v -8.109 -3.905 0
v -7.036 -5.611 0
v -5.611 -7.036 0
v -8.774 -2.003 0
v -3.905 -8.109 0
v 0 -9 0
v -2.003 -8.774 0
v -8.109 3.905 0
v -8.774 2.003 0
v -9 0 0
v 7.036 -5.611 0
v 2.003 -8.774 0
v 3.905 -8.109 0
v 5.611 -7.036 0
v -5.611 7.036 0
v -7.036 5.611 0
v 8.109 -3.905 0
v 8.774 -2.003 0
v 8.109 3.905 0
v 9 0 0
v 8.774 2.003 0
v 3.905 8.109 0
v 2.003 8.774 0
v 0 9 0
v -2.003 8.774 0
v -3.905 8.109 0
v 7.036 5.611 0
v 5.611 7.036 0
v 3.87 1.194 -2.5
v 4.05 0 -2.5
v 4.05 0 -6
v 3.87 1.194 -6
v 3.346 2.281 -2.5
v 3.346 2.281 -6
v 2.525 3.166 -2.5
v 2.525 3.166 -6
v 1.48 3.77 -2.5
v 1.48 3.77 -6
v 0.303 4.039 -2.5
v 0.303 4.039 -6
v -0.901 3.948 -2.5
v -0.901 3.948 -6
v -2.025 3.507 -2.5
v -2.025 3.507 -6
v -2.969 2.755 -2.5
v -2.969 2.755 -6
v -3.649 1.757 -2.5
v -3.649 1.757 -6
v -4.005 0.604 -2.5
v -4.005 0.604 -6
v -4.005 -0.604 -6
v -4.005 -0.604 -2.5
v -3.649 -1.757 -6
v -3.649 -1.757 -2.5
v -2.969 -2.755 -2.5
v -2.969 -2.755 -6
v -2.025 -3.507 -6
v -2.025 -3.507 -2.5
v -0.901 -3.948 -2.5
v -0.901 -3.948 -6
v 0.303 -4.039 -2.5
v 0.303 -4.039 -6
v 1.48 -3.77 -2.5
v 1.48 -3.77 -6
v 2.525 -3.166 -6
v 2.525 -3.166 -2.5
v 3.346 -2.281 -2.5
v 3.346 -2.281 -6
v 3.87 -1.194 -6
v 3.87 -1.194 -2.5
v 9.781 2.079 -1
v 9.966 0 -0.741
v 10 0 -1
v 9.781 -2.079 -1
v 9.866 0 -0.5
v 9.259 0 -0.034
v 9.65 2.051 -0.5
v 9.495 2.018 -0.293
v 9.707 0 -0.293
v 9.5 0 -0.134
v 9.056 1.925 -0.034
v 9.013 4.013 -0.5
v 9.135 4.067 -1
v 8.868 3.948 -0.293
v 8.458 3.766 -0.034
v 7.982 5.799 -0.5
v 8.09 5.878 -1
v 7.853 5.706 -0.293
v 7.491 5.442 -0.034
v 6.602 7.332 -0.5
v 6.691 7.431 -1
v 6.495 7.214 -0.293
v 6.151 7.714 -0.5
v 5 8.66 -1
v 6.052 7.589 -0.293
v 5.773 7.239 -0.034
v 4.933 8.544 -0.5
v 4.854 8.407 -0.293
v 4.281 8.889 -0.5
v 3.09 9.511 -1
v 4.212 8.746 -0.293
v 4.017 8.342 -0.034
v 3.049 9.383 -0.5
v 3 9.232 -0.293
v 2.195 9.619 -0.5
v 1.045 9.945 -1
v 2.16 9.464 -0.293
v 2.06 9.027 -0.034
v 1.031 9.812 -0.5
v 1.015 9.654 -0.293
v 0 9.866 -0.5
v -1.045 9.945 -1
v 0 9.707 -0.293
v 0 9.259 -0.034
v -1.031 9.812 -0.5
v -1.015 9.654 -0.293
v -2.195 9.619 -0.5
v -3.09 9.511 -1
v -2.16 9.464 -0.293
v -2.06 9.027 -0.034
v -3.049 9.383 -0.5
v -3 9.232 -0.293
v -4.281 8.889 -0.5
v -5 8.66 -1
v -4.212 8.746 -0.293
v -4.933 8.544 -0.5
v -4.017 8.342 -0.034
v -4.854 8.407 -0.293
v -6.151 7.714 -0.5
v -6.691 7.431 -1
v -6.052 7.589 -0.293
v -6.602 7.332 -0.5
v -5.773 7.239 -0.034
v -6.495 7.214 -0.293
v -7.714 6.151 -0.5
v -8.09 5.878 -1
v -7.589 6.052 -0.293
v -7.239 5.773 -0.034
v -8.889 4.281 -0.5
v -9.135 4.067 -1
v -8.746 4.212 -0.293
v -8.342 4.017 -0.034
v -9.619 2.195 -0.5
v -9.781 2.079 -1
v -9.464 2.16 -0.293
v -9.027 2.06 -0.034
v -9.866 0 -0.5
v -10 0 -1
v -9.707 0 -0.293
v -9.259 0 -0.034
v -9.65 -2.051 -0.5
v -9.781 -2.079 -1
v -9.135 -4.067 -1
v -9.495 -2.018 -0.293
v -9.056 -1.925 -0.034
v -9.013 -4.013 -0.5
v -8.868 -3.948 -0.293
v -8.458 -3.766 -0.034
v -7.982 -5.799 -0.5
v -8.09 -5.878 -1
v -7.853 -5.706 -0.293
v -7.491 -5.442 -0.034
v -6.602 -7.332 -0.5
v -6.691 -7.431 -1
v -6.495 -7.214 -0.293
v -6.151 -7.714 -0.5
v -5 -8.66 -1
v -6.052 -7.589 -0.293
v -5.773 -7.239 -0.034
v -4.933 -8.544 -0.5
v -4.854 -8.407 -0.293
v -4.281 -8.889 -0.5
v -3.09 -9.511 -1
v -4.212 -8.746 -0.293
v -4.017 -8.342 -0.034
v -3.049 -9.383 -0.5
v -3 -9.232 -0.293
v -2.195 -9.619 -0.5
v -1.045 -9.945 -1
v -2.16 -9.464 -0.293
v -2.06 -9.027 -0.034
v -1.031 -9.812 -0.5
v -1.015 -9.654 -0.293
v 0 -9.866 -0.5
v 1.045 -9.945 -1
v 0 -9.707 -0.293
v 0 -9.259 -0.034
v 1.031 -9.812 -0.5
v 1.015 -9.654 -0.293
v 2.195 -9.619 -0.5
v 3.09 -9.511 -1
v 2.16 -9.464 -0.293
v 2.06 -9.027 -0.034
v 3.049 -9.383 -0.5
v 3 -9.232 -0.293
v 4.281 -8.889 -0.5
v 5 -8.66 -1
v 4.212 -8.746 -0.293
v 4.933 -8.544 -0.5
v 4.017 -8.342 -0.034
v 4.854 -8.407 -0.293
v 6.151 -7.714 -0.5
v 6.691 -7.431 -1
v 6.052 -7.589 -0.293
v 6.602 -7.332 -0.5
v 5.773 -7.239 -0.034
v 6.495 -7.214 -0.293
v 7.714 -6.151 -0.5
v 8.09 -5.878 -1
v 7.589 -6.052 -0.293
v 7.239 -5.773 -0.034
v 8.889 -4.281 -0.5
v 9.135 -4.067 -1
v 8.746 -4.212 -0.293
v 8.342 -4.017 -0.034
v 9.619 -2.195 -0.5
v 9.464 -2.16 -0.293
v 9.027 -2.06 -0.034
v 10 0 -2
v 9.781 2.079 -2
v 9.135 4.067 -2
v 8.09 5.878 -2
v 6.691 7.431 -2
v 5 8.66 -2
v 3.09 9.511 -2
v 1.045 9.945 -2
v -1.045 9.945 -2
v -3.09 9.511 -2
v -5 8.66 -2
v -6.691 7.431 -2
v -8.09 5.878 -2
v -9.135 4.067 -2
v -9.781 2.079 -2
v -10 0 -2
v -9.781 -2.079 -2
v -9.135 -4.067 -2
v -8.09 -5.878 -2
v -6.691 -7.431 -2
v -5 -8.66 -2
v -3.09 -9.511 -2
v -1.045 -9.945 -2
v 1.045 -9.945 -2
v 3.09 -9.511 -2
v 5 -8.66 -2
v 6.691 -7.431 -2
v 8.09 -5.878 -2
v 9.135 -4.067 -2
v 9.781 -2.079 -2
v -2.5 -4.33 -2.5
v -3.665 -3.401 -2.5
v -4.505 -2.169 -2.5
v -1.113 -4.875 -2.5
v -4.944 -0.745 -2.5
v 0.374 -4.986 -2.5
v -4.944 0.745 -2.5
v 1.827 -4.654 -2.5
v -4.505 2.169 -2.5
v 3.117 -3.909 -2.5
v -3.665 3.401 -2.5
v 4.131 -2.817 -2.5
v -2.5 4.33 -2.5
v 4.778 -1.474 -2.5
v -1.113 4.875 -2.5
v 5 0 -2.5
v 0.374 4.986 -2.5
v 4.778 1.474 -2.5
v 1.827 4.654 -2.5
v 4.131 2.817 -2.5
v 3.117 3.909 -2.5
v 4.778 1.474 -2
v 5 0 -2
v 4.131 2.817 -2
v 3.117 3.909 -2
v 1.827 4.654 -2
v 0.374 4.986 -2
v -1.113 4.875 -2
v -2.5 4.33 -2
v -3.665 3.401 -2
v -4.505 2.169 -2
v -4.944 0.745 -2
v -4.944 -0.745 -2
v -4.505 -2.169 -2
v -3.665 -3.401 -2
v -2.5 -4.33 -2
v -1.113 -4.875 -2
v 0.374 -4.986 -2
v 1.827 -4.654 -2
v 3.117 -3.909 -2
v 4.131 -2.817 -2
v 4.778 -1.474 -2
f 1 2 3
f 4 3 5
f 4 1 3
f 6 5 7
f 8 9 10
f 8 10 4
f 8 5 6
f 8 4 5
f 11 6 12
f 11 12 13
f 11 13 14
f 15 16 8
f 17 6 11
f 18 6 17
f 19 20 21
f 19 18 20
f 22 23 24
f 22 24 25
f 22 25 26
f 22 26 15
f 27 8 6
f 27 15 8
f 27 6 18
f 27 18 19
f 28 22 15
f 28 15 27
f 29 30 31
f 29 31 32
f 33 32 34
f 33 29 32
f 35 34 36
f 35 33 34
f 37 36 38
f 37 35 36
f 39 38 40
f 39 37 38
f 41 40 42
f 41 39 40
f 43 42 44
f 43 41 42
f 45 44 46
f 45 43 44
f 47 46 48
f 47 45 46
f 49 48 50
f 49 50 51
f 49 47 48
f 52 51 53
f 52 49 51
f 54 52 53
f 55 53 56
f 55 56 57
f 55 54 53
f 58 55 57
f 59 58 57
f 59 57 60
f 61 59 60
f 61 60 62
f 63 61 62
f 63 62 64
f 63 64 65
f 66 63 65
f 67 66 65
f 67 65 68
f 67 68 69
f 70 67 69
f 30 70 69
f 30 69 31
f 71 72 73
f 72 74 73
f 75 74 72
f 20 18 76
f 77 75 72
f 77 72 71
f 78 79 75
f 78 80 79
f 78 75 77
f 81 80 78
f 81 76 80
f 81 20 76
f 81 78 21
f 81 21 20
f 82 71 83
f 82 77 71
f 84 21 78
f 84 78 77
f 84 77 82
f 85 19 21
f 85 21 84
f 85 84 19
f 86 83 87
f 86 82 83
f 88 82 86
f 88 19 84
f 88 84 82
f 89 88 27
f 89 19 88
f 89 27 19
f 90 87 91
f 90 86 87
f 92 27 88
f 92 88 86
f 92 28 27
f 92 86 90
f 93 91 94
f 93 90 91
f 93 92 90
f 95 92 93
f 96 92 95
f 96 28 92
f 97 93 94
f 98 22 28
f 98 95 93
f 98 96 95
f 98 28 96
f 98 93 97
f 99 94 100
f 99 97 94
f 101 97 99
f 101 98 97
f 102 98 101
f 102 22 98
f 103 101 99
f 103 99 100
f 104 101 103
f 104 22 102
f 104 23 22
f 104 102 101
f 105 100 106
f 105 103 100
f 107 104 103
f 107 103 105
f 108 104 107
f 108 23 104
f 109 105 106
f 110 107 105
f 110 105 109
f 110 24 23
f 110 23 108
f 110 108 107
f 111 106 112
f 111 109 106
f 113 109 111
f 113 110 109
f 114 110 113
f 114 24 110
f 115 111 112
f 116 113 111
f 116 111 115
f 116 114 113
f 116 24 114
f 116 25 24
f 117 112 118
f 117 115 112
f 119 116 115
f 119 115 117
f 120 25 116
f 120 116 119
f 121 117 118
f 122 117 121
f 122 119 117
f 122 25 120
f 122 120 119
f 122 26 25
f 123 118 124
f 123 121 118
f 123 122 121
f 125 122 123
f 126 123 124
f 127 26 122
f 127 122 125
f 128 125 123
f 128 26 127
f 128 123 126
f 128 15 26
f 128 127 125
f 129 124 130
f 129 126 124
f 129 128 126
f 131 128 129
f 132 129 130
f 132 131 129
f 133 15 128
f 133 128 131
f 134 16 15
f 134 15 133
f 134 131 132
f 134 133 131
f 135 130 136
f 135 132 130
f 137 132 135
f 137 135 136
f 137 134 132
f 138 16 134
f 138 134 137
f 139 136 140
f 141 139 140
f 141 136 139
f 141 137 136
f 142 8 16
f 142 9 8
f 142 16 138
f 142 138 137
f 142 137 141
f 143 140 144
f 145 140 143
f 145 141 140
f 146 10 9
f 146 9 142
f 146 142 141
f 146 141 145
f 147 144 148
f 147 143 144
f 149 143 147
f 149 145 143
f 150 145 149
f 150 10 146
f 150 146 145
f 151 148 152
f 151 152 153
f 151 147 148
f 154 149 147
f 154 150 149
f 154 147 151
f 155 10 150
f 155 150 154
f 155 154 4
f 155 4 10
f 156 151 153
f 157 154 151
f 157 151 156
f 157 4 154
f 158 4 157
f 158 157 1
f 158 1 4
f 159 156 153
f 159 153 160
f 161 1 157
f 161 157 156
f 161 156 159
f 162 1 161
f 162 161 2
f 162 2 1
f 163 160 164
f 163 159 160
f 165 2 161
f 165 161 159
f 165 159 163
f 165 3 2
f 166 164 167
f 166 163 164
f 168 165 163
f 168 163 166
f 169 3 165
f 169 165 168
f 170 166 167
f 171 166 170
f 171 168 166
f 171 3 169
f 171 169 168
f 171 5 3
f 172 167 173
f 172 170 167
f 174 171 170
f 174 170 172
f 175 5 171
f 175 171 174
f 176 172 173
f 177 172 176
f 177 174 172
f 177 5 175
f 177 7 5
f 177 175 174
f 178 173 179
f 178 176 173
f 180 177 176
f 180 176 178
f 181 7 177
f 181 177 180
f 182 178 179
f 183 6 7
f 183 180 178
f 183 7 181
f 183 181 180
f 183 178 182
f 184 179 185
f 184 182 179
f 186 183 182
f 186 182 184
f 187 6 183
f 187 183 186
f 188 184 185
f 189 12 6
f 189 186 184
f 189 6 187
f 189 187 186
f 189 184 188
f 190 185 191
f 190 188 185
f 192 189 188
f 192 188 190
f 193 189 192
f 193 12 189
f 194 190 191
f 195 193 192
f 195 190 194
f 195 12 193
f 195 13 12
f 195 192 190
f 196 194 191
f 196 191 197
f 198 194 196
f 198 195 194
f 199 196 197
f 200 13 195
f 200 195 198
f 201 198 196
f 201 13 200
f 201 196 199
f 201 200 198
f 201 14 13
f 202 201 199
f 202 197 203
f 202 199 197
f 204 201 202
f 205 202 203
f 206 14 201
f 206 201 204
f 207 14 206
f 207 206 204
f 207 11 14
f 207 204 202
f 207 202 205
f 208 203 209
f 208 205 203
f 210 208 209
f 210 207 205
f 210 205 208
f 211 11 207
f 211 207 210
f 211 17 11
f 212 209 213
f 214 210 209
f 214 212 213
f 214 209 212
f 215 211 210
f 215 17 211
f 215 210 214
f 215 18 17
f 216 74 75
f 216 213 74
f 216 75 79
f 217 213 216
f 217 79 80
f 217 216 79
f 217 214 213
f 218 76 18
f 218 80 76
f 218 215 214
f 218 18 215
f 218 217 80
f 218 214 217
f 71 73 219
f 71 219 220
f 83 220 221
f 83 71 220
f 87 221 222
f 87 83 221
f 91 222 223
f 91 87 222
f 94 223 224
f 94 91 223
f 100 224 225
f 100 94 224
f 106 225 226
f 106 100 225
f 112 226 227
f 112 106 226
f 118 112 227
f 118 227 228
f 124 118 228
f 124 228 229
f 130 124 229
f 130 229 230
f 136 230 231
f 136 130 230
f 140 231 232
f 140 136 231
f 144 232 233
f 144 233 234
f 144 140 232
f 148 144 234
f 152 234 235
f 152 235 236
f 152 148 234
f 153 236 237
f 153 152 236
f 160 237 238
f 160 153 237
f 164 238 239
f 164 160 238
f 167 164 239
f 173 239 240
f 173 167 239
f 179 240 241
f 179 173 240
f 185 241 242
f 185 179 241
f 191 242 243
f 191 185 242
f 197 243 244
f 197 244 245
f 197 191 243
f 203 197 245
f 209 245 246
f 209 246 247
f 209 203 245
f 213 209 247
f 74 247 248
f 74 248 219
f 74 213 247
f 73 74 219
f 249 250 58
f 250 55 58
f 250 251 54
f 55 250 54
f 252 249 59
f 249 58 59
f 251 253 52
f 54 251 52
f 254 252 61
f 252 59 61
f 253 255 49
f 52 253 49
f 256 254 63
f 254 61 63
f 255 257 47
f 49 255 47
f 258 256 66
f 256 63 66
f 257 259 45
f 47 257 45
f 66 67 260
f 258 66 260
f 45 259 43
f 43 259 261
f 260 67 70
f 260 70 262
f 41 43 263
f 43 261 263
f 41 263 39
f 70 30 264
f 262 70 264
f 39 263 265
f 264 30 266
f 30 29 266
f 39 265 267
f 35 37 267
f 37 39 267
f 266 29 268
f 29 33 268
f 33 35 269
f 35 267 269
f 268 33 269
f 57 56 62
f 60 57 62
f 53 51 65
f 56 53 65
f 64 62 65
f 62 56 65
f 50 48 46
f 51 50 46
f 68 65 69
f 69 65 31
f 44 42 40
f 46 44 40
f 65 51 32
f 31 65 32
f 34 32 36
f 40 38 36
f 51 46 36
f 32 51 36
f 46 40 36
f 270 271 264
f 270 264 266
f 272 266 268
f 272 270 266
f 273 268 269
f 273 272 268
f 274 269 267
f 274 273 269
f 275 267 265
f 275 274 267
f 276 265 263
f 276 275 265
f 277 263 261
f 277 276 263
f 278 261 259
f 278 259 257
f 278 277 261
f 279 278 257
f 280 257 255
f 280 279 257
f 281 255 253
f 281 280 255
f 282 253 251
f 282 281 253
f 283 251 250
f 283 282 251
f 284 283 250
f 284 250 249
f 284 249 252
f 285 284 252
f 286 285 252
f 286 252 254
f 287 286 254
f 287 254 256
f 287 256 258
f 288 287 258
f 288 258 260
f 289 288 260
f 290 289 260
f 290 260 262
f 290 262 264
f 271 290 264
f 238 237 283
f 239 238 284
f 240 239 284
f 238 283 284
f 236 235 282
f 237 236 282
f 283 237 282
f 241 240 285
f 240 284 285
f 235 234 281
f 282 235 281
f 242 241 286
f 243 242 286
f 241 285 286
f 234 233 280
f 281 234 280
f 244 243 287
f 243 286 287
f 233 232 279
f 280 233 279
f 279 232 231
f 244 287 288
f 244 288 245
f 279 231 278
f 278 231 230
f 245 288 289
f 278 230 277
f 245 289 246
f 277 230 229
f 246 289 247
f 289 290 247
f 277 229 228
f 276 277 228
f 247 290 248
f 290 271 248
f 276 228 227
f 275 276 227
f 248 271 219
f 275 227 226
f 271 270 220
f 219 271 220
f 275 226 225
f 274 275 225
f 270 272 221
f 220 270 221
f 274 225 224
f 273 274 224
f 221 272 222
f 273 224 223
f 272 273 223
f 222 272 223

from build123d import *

# Parameters (mm, degrees)
F0_R     = 4.05
F1_DEPTH = 6
F0_R_2   = 5
F2_DEPTH = 2.5
F0_R_3   = 10
F3_DEPTH = 2
F4_R     = 1


with BuildPart() as f1:
    # F0 (on Top) → F1 (new body)
    with BuildSketch(Plane.XY):
        Circle(F0_R)
    extrude(amount=-F1_DEPTH)

    # F0 (on Top) → F2 (join)
    with BuildSketch(Plane.XY):
        Circle(F0_R_2)
        Circle(F0_R, mode=Mode.SUBTRACT)
    extrude(amount=-F2_DEPTH)

    # F0 (on Top) → F3 (join)
    with BuildSketch(Plane.XY):
        Circle(F0_R_3)
        Circle(F0_R_2, mode=Mode.SUBTRACT)
    extrude(amount=-F3_DEPTH)

    # F4
    f4_edges = [f1.edges().sort_by_distance(p)[0] for p in [
        (-10, 0, 0),
    ]]
    fillet(f4_edges, radius=F4_R)


solid = f1.part
